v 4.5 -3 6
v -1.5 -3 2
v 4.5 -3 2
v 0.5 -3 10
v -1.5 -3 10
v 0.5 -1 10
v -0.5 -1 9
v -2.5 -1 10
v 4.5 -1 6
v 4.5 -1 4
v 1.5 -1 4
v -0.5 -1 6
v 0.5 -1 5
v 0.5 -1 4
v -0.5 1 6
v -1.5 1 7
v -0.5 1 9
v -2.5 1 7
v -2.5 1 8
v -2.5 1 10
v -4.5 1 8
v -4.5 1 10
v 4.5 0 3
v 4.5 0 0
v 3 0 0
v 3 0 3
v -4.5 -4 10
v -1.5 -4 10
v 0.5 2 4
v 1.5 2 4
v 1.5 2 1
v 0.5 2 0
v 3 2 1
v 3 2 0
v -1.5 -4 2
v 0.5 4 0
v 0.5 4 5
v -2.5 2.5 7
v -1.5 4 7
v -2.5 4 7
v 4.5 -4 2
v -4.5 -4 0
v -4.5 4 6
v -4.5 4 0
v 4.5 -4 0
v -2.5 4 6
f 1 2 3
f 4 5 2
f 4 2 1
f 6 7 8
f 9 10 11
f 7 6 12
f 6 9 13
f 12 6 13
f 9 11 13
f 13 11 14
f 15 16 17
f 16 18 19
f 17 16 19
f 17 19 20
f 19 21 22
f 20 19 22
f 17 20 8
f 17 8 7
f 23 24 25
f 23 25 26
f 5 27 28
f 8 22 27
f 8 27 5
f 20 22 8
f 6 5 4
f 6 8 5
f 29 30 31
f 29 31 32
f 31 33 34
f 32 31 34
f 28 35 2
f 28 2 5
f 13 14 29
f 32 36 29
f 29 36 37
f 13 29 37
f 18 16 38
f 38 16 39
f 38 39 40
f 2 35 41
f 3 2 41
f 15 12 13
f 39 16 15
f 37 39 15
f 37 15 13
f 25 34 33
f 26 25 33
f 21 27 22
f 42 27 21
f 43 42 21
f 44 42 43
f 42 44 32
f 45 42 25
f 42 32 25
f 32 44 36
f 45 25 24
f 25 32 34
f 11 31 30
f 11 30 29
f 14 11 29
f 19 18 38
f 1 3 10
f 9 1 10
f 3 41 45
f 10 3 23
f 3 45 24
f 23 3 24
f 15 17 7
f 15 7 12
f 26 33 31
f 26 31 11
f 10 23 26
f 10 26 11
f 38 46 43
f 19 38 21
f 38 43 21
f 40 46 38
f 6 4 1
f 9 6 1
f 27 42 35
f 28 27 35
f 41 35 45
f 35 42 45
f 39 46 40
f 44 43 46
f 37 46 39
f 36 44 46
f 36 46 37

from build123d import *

# Parameters (mm, degrees)
SKETCH1_W           = 9
SKETCH1_H           = 8
BOSS_EXTRUDE1_DEPTH = 10
CUT_EXTRUDE1_DEPTH  = 1.5
CUT_EXTRUDE2_DEPTH  = 1.5
SKETCH6_W           = 6
SKETCH6_H           = 8
CUT_EXTRUDE3_DEPTH  = 1
CUT_EXTRUDE4_DEPTH  = 8
CUT_EXTRUDE5_DEPTH  = 5
CUT_EXTRUDE6_DEPTH  = 1
CUT_EXTRUDE9_DEPTH  = 2
CUT_EXTRUDE10_DEPTH = 3


with BuildPart() as part:
    # Sketch1 → Boss-Extrude1 (new body)
    with BuildSketch(Plane.XY):
        Rectangle(SKETCH1_W, SKETCH1_H)
    extrude(amount=BOSS_EXTRUDE1_DEPTH)

    # Sketch3 → Cut-Extrude1 (cut)
    with BuildSketch(Plane(origin=(4.5, 0, 0), x_dir=(0, 0, -1), z_dir=(1, 0, 0))):
        Polygon((0, 4), (0, 0), (-3, 0), (-4, -1), (-4, 4), align=None)
    extrude(amount=-CUT_EXTRUDE1_DEPTH, mode=Mode.SUBTRACT)

    # Sketch4 → Cut-Extrude2 (cut)
    with BuildSketch(Plane(origin=(3, 0, 0), x_dir=(0, 0, -1), z_dir=(1, 0, 0))):
        Polygon((0, 4), (0, 2), (-1, 2), (-4, -1), (-4, 4), align=None)
    extrude(amount=-CUT_EXTRUDE2_DEPTH, mode=Mode.SUBTRACT)

    # Sketch6 → Cut-Extrude3 (cut)
    with BuildSketch(Plane.XZ.offset(4)):
        with Locations((1.5, 6)):
            Rectangle(SKETCH6_W, SKETCH6_H)
    extrude(amount=-CUT_EXTRUDE3_DEPTH, mode=Mode.SUBTRACT)

    # Sketch7 → Cut-Extrude4 (cut, through all)
    with BuildSketch(Plane(origin=(0, -3, 0), x_dir=(-1, 0, 0), z_dir=(0, -1, 0))):
        Polygon((-0.5, -10), (-4.5, -6), (-4.5, -10), align=None)
    extrude(amount=-CUT_EXTRUDE4_DEPTH, mode=Mode.SUBTRACT)

    # Sketch8 → Cut-Extrude5 (cut)
    with BuildSketch(Plane(origin=(0, 4, 0), x_dir=(1, 0, 0), z_dir=(0, 1, 0))):
        Polygon((4.5, -4), (4.5, -6), (0.5, -10), (-2.5, -10), (-0.5, -9), (-0.5, -6), (0.5, -5), (0.5, -4), (1.5, -4), align=None)
    extrude(amount=-CUT_EXTRUDE5_DEPTH, mode=Mode.SUBTRACT)

    # Sketch9 → Cut-Extrude6 (cut)
    with BuildSketch(Plane(origin=(1.5, 0, 0), x_dir=(0, 0, -1), z_dir=(1, 0, 0))):
        Polygon((-1, 2), (-4, 2), (-4, 4), (0, 4), (0, 2), align=None)
    extrude(amount=-CUT_EXTRUDE6_DEPTH, mode=Mode.SUBTRACT)

    # Sketch10 → Cut-Extrude9 (cut)
    with BuildSketch(Plane.ZY.offset(4.5)):
        Polygon((6, 4), (8, 1), (10, 1), (10, 4), align=None)
    extrude(amount=-CUT_EXTRUDE9_DEPTH, mode=Mode.SUBTRACT)

    # Sketch12 → Cut-Extrude10 (cut)
    with BuildSketch(Plane(origin=(0, 4, 0), x_dir=(1, 0, 0), z_dir=(0, 1, 0))):
        Polygon((0.5, -5), (-1.5, -7), (-2.5, -7), (-2.5, -10), (0.5, -8.5), align=None)
    extrude(amount=-CUT_EXTRUDE10_DEPTH, mode=Mode.SUBTRACT)


solid = part.part
